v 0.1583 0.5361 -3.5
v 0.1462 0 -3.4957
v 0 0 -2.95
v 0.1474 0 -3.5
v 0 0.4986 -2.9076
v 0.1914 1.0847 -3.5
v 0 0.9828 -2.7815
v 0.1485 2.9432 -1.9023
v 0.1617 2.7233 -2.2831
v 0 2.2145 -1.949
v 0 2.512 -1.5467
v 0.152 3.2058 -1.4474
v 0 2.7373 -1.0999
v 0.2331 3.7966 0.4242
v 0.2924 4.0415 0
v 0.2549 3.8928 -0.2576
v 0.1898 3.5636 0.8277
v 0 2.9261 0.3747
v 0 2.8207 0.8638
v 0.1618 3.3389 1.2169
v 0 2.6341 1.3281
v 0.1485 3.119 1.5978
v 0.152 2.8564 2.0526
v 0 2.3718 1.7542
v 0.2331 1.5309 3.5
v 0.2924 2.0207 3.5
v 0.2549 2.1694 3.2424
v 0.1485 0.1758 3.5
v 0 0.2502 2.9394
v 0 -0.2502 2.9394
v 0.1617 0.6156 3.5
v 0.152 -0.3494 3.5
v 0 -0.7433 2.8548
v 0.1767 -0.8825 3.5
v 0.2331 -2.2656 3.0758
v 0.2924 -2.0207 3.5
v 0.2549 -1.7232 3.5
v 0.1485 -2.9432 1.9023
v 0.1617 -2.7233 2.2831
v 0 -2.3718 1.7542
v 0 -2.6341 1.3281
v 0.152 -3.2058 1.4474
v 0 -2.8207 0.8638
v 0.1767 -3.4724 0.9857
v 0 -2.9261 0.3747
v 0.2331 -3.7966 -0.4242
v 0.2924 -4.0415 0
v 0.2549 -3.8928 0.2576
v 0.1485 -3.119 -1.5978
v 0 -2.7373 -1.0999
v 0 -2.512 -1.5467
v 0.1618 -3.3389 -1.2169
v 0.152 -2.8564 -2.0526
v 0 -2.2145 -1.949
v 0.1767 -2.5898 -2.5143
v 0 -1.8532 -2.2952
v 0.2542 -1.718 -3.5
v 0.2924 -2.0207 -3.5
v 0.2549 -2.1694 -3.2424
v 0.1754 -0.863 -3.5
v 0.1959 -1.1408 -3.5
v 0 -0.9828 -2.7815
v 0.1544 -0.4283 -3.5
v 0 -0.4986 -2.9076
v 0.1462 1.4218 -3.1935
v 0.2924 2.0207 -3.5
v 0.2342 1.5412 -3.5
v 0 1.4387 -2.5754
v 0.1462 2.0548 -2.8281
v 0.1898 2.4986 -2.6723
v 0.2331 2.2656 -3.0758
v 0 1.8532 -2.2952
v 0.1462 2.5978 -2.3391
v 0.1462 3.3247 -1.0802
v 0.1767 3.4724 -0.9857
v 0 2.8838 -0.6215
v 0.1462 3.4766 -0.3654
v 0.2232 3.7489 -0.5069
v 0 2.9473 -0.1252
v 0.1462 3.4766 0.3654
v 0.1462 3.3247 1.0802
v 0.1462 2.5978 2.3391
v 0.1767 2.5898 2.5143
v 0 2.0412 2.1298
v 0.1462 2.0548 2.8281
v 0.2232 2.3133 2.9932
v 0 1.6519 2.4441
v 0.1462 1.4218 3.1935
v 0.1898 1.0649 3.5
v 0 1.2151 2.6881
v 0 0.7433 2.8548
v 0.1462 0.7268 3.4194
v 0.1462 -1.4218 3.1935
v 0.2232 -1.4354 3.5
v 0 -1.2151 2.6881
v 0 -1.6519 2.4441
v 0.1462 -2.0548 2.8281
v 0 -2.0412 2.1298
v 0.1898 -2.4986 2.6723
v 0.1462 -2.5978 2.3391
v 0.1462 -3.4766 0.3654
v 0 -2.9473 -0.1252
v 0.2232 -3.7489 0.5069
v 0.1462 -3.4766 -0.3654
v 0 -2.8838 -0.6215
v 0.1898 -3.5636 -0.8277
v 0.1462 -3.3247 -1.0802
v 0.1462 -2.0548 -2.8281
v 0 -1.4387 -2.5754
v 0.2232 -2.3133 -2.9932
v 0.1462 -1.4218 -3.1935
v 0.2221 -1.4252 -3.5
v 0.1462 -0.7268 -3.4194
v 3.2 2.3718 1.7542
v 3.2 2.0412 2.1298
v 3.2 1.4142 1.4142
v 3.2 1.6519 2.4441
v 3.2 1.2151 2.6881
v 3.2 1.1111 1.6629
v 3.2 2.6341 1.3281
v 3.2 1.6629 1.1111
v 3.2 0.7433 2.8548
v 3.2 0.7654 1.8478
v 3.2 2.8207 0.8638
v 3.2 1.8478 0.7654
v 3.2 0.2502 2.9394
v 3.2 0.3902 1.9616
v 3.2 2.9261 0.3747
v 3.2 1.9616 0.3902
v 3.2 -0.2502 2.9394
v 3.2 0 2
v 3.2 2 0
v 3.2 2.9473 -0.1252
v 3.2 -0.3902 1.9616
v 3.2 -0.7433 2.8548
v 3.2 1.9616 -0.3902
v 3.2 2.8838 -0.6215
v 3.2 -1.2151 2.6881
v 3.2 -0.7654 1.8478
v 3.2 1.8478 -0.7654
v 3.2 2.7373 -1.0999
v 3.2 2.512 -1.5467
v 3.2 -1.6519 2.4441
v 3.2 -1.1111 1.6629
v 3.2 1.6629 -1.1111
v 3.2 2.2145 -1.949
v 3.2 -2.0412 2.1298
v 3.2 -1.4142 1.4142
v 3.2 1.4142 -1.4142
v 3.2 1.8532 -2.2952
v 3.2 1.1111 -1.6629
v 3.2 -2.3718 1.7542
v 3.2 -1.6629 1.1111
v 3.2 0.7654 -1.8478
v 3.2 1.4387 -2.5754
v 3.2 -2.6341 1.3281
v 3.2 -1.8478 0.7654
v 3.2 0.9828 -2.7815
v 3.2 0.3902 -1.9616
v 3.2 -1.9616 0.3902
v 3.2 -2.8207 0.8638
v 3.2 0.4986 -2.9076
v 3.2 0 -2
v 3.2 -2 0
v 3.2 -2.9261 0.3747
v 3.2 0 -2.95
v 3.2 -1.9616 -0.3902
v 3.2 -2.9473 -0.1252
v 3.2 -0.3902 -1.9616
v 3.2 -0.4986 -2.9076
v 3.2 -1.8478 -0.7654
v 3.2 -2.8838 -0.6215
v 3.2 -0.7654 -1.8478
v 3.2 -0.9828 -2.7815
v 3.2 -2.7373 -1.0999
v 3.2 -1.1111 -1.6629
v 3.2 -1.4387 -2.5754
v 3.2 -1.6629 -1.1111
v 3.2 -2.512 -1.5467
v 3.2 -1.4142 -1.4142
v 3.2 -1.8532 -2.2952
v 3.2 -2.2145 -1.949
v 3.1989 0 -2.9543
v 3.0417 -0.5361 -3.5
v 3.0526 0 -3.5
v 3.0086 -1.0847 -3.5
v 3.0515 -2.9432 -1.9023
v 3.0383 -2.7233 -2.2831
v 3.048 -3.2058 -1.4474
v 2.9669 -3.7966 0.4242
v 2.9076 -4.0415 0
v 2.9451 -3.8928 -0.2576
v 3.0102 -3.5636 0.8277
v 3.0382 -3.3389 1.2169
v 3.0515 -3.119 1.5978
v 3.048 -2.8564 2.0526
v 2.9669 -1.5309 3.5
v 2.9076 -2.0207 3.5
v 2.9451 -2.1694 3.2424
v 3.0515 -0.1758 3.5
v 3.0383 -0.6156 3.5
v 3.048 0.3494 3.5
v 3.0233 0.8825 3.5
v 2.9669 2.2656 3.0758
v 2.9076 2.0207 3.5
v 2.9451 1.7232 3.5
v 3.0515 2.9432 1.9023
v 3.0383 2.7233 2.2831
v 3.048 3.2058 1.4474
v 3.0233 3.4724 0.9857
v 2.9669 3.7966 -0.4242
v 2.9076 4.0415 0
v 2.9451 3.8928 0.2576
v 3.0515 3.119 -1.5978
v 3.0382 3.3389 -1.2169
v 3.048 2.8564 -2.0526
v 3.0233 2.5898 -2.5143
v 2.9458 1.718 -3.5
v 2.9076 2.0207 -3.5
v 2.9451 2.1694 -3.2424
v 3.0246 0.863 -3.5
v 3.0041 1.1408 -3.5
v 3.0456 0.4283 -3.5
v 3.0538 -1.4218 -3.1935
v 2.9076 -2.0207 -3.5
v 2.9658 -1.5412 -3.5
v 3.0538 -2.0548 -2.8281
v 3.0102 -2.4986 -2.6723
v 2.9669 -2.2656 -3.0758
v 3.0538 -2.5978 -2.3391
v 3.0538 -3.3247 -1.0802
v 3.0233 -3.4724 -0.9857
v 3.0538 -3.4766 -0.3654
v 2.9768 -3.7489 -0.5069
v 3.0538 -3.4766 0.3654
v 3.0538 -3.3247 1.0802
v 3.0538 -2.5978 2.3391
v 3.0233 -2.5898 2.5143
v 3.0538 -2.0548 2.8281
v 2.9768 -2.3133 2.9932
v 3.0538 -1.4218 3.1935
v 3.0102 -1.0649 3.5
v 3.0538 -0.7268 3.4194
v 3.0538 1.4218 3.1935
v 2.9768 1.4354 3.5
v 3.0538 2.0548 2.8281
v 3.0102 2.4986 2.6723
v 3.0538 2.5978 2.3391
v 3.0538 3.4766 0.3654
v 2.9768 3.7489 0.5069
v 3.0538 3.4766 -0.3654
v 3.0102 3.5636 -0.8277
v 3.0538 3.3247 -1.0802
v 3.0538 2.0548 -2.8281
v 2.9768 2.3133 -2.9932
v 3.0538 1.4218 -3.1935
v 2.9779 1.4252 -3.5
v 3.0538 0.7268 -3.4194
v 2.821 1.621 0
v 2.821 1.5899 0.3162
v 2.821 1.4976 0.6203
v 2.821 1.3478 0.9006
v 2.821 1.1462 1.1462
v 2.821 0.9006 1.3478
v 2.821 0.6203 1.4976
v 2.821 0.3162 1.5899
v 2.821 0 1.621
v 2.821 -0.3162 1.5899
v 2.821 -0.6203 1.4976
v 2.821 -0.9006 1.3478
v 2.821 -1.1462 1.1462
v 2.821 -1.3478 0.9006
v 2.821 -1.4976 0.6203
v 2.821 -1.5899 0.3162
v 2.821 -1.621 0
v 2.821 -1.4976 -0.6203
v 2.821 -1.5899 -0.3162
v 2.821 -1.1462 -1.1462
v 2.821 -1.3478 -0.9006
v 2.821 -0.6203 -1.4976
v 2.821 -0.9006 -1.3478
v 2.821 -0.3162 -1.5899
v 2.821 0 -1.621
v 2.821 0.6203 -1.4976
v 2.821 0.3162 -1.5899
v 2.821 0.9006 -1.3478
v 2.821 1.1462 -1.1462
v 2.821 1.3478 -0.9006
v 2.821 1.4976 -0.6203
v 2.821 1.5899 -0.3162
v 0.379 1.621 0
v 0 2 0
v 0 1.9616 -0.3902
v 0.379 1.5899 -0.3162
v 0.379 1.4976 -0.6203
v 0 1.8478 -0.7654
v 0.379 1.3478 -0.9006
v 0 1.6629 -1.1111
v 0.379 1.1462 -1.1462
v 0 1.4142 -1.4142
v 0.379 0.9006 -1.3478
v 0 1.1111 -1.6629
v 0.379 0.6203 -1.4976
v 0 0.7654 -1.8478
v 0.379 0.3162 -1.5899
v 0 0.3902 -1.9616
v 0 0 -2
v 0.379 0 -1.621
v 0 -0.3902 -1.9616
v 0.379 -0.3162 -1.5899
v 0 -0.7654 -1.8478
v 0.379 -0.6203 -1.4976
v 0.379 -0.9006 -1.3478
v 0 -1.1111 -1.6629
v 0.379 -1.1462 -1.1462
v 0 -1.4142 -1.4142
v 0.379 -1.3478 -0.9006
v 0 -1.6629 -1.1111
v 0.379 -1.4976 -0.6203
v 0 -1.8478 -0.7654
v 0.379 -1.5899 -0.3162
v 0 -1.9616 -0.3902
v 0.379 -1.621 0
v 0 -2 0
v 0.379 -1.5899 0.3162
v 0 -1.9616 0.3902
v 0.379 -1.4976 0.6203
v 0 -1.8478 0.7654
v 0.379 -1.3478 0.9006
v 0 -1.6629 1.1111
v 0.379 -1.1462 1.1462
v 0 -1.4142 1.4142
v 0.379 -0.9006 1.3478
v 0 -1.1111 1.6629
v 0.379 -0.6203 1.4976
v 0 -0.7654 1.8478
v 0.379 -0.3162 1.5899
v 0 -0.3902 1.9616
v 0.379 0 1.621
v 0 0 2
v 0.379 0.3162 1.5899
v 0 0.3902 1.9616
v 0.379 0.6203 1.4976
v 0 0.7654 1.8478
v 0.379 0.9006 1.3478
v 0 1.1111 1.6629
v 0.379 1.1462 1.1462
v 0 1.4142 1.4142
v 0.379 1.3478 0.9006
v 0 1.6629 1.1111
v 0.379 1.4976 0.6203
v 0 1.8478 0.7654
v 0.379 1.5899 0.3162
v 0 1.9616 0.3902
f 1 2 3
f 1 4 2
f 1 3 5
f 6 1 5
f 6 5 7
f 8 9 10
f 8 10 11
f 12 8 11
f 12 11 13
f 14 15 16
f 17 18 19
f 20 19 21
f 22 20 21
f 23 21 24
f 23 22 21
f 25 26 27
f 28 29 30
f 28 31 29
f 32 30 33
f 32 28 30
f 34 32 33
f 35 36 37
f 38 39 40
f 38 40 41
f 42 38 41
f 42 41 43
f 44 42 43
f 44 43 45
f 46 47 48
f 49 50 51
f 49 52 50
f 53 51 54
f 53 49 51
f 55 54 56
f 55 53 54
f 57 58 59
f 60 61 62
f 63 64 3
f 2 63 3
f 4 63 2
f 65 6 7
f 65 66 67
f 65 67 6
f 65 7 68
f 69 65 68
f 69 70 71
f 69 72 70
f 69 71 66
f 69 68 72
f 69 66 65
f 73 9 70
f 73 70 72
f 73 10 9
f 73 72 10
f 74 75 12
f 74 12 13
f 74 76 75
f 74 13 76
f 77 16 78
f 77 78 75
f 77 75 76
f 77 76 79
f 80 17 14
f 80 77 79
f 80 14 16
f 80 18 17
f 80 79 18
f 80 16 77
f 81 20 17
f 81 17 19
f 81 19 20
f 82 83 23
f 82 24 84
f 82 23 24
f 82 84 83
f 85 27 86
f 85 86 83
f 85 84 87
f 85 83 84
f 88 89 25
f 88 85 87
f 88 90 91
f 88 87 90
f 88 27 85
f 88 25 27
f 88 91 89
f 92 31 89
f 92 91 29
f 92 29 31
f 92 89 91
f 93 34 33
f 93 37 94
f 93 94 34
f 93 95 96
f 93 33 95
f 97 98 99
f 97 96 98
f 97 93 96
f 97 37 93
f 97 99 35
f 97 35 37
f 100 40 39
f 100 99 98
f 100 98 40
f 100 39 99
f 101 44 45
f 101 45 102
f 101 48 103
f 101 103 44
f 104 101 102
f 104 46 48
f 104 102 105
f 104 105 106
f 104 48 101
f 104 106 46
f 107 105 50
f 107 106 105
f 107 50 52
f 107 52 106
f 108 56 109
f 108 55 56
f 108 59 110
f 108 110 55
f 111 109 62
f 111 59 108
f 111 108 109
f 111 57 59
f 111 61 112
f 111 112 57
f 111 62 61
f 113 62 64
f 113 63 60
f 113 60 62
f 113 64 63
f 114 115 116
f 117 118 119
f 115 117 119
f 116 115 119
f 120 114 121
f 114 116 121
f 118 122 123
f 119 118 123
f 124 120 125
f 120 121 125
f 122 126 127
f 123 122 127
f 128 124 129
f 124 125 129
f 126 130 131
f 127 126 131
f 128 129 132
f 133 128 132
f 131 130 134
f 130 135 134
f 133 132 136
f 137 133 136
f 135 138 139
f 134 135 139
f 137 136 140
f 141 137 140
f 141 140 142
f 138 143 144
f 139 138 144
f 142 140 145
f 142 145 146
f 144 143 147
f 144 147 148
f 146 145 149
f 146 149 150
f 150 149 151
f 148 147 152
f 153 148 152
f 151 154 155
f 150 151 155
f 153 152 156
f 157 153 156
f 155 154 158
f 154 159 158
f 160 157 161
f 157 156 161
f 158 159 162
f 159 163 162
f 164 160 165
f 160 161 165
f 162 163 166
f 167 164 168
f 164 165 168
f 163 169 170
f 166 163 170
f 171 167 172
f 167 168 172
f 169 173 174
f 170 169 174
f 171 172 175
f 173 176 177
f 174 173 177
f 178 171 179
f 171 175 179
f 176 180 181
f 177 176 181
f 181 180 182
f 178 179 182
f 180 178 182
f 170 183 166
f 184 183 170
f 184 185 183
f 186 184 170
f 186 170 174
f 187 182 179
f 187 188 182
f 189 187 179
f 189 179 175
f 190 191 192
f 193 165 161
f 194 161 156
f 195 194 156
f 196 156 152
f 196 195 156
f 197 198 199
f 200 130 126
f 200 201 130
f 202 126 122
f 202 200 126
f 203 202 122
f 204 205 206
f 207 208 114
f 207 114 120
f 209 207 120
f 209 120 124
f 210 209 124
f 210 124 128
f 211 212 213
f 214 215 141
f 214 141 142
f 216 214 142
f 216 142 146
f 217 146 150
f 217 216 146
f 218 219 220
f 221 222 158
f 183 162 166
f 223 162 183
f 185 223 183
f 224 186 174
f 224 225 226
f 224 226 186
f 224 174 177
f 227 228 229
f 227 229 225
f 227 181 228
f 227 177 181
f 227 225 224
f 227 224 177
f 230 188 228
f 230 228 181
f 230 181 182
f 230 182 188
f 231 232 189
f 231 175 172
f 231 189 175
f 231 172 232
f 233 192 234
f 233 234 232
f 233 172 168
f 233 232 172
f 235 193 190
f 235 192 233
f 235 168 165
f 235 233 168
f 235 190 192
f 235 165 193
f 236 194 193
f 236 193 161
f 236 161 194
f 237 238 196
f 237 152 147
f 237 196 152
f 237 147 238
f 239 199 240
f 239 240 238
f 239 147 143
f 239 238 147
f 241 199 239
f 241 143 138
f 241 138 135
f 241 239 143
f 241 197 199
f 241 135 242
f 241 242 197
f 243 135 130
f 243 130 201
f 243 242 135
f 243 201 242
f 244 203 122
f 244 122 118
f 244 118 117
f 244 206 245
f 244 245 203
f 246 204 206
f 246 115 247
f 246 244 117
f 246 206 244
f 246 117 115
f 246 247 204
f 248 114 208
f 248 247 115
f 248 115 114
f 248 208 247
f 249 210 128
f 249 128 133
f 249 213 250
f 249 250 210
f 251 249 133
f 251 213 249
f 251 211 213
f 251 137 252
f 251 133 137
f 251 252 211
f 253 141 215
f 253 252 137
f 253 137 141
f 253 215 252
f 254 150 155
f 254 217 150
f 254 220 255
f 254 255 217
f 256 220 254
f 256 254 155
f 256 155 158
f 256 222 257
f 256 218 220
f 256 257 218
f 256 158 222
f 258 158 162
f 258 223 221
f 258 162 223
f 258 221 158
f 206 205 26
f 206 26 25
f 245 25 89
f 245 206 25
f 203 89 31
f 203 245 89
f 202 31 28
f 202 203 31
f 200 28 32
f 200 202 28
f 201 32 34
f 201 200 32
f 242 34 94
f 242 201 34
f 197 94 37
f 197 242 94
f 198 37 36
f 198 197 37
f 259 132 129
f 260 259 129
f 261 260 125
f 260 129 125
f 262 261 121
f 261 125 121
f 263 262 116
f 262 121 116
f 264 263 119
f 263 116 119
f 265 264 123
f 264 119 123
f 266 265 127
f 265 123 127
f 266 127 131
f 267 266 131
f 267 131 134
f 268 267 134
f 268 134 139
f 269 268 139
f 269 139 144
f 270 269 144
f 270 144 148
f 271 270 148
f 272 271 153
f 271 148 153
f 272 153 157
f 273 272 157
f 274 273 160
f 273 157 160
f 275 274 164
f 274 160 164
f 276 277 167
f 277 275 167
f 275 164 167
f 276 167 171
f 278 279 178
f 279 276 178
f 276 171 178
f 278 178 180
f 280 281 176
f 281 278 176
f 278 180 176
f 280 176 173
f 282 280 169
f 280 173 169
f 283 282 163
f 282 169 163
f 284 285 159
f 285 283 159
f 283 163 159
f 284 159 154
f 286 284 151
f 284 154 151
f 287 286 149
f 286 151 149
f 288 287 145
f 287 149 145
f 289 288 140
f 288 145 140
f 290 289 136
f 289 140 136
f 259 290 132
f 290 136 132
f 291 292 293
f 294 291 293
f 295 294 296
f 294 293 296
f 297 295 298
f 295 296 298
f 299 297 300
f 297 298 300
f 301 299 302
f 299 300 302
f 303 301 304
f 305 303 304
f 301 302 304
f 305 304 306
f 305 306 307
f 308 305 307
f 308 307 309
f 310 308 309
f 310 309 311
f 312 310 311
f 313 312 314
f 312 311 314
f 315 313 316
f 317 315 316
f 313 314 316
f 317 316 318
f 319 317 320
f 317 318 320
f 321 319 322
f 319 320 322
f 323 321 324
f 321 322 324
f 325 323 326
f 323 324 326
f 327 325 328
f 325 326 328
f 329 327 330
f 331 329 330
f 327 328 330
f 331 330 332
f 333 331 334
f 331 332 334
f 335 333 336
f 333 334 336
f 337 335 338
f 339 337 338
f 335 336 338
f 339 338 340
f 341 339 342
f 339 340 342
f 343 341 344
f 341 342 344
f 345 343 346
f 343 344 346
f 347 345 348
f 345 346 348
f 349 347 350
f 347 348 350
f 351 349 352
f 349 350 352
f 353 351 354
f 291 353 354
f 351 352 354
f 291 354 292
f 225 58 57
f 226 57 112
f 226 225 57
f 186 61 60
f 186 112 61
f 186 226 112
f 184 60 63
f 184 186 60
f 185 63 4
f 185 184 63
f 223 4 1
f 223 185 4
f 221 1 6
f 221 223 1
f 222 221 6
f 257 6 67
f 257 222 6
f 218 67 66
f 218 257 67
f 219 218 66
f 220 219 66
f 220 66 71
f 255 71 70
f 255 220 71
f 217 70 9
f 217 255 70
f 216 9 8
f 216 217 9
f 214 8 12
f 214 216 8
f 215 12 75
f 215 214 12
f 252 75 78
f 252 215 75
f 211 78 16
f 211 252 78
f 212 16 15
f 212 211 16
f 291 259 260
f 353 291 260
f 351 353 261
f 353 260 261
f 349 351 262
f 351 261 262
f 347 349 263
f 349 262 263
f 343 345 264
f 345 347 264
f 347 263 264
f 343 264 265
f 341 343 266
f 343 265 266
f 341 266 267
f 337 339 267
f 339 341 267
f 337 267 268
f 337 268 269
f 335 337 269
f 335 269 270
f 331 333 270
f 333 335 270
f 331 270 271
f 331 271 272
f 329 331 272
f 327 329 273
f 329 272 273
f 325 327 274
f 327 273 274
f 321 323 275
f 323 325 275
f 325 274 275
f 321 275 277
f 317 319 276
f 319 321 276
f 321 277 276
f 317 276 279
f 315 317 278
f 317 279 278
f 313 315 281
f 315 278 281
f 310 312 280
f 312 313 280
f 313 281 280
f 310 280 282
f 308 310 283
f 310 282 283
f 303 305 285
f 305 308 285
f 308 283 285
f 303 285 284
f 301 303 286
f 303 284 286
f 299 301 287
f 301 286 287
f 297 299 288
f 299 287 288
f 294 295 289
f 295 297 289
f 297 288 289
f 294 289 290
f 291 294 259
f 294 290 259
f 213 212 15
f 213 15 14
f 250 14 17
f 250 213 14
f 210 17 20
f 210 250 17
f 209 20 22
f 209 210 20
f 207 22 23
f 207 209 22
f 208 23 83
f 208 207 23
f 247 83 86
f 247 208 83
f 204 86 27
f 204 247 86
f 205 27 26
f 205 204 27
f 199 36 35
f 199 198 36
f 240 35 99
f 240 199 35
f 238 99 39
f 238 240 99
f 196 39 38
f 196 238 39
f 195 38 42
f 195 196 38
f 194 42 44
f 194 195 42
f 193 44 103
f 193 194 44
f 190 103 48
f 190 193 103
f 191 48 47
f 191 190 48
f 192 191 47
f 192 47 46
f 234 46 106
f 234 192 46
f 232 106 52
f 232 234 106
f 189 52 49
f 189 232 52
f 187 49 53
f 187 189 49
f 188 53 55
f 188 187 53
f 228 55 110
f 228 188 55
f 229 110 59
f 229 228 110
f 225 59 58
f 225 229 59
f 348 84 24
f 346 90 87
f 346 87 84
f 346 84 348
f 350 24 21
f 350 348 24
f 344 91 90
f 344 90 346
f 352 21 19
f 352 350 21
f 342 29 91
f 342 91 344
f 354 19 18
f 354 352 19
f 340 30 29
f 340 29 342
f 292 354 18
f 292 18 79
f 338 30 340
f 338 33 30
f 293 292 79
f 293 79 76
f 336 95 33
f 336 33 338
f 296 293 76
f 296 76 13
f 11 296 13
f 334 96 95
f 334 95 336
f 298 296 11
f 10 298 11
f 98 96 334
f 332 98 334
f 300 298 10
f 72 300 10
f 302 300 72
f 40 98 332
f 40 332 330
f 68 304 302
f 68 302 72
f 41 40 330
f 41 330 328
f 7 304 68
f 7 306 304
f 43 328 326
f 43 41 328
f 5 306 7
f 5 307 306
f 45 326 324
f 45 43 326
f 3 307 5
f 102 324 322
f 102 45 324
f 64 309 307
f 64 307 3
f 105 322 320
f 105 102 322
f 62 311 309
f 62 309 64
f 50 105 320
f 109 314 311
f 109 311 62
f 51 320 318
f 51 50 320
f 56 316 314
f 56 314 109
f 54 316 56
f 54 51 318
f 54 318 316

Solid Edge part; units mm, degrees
sketch "Sketch1" plane through (0, 0, 0) normal (0, -1, 0) x (1, 0, 0)
  line L0 (0, 0) -> (0, -2.95)
  line L1 (0, -2.95) -> (0.3349, -4.2)
  line L2 (0.3349, -4.2) -> (2.8651, -4.2)
  line L3 (2.8651, -4.2) -> (3.2, -2.95)
  line L4 (3.2, -2.95) -> (3.2, 0)
  line L5 (3.2, 0) -> (0, 0)
revolve "RevolvedProtrusion1" add sketch "Sketch1" angle 360 about axis through (3.2, 0, 0) along (-1, 0, 0)
sketch "Sketch2" plane through (0, 0, 0) normal (1, 0, 0) x (0, 1, 0)
  line L0 (14, 14) -> (-14, 14)
  line L1 (-14, 14) -> (-14, -14)
  line L2 (-14, -14) -> (14, -14)
  line L3 (14, -14) -> (14, 14)
  line L4 (2.0207, 3.5) -> (-2.0207, 3.5)
  line L5 (-2.0207, 3.5) -> (-4.0415, 0)
  line L6 (-4.0415, 0) -> (-2.0207, -3.5)
  line L7 (-2.0207, -3.5) -> (2.0207, -3.5)
  line L8 (2.0207, -3.5) -> (4.0415, 0)
  line L9 (4.0415, 0) -> (2.0207, 3.5)
extrude "ExtrudedCutout_1" cut sketch "Sketch2" against normal blind 4.2 and the other way blind 4.2
sketch "Sketch3" plane through (0, 0, 0) normal (0, 0, 1) x (1, 0, 0)
  line L0 (0, 0) -> (0, 2)
  line L1 (0, 2) -> (0.379, 1.621)
  line L2 (0.379, 1.621) -> (2.821, 1.621)
  line L3 (2.821, 1.621) -> (3.2, 2)
  line L4 (3.2, 2) -> (3.2, 0)
  line L5 (3.2, 0) -> (0, 0)
revolve "RevolvedCutout1" cut sketch "Sketch3" angle 360 about axis through (3.2, 0, 0) along (-1, 0, 0)
cosmetic_thread "Thread1" size "M4"
properties part number "Hexagon nut - style 1 JIS B 1181 M4"
